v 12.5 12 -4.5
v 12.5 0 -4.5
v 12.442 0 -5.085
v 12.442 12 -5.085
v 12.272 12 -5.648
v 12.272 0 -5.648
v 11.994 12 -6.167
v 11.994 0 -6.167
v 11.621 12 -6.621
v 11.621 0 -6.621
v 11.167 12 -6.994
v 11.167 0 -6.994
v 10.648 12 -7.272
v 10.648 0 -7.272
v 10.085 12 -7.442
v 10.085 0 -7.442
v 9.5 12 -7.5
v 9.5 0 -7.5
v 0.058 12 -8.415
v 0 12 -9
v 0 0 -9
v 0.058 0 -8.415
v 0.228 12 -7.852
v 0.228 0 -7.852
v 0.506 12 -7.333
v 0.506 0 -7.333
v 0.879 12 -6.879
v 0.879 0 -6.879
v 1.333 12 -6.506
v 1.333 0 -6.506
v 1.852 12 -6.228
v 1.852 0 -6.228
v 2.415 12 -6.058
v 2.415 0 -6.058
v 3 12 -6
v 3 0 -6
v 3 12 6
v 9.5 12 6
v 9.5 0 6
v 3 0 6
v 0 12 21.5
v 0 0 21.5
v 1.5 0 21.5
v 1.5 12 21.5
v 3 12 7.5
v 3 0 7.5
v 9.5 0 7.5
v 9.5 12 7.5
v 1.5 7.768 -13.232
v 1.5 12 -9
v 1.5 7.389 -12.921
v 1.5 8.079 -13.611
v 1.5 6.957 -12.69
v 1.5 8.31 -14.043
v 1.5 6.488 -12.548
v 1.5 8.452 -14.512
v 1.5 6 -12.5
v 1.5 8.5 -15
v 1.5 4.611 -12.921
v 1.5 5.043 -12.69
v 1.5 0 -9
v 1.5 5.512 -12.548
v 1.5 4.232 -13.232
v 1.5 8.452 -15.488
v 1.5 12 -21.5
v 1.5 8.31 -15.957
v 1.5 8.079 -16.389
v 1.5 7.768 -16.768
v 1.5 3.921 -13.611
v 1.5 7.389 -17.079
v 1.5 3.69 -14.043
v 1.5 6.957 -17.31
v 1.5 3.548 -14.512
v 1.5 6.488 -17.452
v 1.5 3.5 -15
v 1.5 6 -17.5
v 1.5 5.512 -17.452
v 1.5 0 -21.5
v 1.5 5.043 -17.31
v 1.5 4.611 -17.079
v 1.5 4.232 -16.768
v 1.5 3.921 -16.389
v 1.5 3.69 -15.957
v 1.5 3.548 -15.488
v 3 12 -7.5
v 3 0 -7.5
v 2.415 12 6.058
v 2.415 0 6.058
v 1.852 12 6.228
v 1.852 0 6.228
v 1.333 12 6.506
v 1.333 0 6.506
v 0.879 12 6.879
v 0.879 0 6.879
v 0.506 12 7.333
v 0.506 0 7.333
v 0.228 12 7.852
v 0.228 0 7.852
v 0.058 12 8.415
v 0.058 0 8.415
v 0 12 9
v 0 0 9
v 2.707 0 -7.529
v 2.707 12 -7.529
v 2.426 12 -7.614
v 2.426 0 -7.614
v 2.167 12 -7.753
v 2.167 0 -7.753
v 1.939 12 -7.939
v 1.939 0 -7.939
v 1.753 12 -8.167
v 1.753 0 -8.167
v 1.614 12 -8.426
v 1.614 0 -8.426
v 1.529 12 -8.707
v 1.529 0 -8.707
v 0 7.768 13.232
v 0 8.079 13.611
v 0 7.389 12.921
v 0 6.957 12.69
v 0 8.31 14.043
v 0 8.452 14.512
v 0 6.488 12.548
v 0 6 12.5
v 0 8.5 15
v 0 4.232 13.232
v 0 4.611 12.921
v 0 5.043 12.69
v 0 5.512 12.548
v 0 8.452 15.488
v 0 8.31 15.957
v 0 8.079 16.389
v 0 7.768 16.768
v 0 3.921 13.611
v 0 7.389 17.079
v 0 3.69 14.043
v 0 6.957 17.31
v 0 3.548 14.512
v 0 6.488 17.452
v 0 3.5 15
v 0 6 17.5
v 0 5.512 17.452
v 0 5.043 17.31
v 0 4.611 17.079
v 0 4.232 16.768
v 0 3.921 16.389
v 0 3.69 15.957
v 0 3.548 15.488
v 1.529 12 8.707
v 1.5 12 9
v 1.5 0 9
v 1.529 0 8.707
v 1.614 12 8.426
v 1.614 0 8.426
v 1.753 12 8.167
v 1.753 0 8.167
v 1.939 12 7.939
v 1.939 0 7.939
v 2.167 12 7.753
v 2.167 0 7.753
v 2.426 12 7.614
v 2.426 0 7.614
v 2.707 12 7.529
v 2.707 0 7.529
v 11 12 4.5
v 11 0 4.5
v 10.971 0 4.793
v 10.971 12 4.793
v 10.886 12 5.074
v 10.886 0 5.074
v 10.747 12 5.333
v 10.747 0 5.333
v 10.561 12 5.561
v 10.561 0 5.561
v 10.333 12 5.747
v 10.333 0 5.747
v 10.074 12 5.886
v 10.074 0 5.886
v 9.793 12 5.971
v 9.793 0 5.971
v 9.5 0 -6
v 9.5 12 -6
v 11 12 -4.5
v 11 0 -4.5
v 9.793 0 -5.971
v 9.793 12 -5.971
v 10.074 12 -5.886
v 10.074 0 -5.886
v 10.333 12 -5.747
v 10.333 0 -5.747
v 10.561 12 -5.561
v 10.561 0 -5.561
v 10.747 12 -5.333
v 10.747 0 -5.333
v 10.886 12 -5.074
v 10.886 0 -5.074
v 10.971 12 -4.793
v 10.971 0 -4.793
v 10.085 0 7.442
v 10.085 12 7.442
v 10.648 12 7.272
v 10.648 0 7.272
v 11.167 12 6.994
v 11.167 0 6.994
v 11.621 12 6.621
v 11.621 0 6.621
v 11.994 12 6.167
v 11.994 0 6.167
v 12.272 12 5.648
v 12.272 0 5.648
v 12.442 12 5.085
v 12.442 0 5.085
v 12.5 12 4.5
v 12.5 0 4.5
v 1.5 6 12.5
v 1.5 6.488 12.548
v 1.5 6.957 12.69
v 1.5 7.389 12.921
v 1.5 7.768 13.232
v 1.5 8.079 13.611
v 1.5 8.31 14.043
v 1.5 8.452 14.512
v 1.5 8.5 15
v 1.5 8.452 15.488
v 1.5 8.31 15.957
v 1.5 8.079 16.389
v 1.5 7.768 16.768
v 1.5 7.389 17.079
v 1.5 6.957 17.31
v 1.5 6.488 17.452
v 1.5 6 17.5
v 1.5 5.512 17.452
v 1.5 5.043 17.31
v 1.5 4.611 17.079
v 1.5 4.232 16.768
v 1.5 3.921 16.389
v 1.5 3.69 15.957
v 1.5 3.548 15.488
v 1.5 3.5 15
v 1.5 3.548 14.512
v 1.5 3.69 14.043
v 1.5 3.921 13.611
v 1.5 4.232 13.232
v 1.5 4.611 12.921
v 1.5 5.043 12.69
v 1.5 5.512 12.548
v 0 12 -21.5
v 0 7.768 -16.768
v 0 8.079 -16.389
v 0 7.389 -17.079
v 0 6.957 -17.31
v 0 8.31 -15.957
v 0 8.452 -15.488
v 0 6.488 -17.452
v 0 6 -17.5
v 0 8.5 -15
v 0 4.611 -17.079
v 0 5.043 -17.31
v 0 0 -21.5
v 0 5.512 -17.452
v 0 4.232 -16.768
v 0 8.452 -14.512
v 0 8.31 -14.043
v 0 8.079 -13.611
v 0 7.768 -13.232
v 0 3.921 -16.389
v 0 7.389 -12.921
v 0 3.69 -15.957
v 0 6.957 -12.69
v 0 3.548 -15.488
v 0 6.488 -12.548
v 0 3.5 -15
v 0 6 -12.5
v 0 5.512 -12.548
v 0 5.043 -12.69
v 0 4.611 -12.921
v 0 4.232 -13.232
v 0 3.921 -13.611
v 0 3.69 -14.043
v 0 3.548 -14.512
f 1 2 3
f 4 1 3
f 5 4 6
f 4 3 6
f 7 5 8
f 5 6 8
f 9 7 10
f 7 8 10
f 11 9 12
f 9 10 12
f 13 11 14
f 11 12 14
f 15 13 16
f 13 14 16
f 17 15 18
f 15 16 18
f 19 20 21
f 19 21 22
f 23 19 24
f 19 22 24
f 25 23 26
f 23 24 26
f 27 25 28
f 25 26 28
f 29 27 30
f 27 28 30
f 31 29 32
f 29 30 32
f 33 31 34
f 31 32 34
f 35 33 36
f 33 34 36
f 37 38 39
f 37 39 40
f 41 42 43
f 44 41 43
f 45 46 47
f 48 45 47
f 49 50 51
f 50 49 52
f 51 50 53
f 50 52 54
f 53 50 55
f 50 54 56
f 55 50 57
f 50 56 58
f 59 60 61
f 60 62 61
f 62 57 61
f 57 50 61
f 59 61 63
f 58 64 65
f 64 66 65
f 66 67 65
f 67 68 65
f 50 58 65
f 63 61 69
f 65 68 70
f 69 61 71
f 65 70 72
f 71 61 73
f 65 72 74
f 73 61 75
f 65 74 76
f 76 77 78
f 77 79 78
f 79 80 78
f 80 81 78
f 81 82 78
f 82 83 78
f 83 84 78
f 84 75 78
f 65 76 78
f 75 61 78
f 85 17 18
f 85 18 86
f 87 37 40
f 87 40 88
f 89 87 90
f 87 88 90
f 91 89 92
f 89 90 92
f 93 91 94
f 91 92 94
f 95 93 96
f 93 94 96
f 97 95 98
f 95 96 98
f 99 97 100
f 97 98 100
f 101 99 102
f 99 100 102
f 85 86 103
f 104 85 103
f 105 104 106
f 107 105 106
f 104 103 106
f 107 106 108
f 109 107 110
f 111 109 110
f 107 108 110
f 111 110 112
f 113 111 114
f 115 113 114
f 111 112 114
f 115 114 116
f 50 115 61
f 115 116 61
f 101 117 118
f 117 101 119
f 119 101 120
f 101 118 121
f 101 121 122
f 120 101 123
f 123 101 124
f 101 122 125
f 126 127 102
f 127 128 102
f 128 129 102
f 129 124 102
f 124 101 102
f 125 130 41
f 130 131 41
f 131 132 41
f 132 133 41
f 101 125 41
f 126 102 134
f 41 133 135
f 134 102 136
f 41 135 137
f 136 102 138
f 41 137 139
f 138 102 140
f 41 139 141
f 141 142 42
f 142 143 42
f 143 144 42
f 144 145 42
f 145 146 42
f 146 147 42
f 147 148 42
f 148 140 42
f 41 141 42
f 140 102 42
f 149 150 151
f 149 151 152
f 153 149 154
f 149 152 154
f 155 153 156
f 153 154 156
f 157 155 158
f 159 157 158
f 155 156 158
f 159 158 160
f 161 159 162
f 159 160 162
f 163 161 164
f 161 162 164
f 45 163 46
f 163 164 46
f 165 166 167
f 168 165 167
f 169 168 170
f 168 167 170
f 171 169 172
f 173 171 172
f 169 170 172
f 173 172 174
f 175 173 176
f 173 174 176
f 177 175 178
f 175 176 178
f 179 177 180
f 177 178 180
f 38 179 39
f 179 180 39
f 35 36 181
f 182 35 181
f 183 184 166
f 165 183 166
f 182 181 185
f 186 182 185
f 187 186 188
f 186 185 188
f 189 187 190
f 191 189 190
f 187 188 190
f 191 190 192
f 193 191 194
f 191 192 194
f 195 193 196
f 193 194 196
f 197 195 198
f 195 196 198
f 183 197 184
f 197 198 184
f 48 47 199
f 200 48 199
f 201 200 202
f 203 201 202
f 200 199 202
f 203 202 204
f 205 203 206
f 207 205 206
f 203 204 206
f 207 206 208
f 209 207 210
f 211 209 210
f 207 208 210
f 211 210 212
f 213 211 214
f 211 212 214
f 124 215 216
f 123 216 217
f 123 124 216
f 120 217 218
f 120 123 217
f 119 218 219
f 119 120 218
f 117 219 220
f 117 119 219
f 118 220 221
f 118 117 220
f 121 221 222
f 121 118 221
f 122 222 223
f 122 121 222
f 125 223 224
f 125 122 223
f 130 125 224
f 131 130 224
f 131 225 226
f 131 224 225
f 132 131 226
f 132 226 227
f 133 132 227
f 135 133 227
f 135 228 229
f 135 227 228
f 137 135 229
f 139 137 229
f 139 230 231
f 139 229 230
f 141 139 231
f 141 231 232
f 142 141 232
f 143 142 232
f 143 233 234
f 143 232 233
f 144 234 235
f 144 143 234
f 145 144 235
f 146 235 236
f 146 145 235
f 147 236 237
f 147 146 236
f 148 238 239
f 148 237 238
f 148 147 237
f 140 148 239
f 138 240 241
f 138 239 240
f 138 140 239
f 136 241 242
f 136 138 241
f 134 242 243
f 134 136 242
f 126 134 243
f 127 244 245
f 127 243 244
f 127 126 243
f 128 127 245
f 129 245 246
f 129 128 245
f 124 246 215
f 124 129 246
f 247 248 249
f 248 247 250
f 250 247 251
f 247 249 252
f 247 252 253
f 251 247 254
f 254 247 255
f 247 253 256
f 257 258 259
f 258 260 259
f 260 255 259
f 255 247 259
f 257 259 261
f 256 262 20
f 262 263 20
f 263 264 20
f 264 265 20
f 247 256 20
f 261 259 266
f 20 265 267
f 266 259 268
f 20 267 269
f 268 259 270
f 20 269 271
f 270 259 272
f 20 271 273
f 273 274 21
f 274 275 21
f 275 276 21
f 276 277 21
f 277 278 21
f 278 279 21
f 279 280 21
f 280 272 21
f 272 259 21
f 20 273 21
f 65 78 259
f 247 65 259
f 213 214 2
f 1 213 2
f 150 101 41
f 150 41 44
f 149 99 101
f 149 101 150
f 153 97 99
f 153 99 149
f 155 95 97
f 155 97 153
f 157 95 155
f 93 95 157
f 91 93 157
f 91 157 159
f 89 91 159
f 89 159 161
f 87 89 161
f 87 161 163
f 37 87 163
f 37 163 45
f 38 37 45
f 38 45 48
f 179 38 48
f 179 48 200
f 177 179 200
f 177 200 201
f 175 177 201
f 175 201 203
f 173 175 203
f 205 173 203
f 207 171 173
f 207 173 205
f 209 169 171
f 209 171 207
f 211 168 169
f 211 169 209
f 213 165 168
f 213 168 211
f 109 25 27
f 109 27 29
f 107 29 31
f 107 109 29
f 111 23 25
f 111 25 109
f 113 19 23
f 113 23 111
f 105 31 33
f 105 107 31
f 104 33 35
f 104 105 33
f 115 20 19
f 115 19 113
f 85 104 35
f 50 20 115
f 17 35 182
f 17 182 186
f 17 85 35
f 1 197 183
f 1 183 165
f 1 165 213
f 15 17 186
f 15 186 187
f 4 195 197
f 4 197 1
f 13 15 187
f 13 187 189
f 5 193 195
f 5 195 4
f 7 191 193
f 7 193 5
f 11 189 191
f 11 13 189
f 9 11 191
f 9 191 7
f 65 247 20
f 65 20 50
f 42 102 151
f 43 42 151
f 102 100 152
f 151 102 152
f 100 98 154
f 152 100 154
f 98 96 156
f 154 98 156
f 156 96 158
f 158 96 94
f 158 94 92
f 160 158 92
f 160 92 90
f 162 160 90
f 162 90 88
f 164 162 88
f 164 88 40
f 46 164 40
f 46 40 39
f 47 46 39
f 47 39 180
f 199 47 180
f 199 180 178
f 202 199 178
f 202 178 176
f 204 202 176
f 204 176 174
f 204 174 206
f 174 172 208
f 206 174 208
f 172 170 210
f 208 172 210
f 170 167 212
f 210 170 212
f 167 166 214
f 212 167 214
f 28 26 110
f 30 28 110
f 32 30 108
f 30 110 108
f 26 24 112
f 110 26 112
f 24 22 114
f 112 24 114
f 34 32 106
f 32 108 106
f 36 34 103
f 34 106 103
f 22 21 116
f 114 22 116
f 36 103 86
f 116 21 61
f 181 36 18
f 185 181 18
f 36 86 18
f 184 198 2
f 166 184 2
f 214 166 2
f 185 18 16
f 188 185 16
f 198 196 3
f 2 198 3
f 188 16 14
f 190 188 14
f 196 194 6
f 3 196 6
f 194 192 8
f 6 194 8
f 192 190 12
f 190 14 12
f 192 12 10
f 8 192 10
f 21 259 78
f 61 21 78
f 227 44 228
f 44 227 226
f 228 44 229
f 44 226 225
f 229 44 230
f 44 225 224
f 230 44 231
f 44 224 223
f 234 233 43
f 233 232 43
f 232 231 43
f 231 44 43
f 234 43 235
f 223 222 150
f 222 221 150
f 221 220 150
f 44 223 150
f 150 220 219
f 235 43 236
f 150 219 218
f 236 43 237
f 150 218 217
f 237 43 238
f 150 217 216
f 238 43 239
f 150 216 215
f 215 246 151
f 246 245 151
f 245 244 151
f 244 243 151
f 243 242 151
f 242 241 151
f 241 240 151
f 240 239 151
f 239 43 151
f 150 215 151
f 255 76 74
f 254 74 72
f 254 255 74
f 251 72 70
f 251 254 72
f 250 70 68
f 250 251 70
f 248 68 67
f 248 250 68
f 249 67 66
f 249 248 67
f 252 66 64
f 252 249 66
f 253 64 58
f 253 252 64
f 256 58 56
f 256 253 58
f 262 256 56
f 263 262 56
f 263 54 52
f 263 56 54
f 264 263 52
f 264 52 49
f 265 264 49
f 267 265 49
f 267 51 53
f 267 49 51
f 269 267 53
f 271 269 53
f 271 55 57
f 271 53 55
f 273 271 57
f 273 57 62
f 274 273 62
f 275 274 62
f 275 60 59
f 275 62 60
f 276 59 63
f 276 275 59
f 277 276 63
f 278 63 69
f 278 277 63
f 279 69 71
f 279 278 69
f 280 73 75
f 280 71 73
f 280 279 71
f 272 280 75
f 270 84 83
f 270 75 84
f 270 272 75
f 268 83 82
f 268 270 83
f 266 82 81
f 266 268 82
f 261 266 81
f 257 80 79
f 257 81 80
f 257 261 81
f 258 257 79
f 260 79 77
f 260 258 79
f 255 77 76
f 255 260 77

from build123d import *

# Parameters (mm, degrees)
EXTRUDE_THIN1_DEPTH = 12
SKETCH2_R           = 2.5
CUT_EXTRUDE1_DEPTH  = 28.613402543


with BuildPart() as part:
    # Sketch1 → Extrude-Thin1 (new body)
    with BuildSketch(Plane(origin=(0, 0, 0), x_dir=(1, 0, 0), z_dir=(0, 1, 0))):
        with BuildLine():
            Line((0, 21.5), (0, 9))
            ThreePointArc((0, 9), (0.878679656, 6.878679656), (3, 6))
            Line((3, 6), (9.5, 6))
            ThreePointArc((9.5, 6), (10.560660172, 5.560660172), (11, 4.5))
            Line((11, 4.5), (11, -4.5))
            ThreePointArc((11, -4.5), (10.560660172, -5.560660172), (9.5, -6))
            Line((9.5, -6), (3, -6))
            ThreePointArc((3, -6), (0.878679656, -6.878679656), (0, -9))
            Line((0, -9), (0, -21.5))
            Line((0, -21.5), (1.5, -21.5))
            Line((1.5, -21.5), (1.5, -9))
            ThreePointArc((1.5, -9), (1.939339828, -7.939339828), (3, -7.5))
            Line((3, -7.5), (9.5, -7.5))
            ThreePointArc((9.5, -7.5), (11.621320344, -6.621320344), (12.5, -4.5))
            Line((12.5, -4.5), (12.5, 4.5))
            ThreePointArc((12.5, 4.5), (11.621320344, 6.621320344), (9.5, 7.5))
            Line((9.5, 7.5), (3, 7.5))
            ThreePointArc((3, 7.5), (1.939339828, 7.939339828), (1.5, 9))
            Line((1.5, 9), (1.5, 21.5))
            Line((1.5, 21.5), (0, 21.5))
        make_face()
    extrude(amount=EXTRUDE_THIN1_DEPTH)

    # Sketch2 → Cut-Extrude1 (cut, through all)
    with BuildSketch(Plane(origin=(0, 0, 0), x_dir=(0, 0, -1), z_dir=(1, 0, 0))):
        with Locations((-15, 6)):
            Circle(SKETCH2_R)
        with Locations((15, 6)):
            Circle(SKETCH2_R)
    extrude(amount=CUT_EXTRUDE1_DEPTH, mode=Mode.SUBTRACT)


solid = part.part
